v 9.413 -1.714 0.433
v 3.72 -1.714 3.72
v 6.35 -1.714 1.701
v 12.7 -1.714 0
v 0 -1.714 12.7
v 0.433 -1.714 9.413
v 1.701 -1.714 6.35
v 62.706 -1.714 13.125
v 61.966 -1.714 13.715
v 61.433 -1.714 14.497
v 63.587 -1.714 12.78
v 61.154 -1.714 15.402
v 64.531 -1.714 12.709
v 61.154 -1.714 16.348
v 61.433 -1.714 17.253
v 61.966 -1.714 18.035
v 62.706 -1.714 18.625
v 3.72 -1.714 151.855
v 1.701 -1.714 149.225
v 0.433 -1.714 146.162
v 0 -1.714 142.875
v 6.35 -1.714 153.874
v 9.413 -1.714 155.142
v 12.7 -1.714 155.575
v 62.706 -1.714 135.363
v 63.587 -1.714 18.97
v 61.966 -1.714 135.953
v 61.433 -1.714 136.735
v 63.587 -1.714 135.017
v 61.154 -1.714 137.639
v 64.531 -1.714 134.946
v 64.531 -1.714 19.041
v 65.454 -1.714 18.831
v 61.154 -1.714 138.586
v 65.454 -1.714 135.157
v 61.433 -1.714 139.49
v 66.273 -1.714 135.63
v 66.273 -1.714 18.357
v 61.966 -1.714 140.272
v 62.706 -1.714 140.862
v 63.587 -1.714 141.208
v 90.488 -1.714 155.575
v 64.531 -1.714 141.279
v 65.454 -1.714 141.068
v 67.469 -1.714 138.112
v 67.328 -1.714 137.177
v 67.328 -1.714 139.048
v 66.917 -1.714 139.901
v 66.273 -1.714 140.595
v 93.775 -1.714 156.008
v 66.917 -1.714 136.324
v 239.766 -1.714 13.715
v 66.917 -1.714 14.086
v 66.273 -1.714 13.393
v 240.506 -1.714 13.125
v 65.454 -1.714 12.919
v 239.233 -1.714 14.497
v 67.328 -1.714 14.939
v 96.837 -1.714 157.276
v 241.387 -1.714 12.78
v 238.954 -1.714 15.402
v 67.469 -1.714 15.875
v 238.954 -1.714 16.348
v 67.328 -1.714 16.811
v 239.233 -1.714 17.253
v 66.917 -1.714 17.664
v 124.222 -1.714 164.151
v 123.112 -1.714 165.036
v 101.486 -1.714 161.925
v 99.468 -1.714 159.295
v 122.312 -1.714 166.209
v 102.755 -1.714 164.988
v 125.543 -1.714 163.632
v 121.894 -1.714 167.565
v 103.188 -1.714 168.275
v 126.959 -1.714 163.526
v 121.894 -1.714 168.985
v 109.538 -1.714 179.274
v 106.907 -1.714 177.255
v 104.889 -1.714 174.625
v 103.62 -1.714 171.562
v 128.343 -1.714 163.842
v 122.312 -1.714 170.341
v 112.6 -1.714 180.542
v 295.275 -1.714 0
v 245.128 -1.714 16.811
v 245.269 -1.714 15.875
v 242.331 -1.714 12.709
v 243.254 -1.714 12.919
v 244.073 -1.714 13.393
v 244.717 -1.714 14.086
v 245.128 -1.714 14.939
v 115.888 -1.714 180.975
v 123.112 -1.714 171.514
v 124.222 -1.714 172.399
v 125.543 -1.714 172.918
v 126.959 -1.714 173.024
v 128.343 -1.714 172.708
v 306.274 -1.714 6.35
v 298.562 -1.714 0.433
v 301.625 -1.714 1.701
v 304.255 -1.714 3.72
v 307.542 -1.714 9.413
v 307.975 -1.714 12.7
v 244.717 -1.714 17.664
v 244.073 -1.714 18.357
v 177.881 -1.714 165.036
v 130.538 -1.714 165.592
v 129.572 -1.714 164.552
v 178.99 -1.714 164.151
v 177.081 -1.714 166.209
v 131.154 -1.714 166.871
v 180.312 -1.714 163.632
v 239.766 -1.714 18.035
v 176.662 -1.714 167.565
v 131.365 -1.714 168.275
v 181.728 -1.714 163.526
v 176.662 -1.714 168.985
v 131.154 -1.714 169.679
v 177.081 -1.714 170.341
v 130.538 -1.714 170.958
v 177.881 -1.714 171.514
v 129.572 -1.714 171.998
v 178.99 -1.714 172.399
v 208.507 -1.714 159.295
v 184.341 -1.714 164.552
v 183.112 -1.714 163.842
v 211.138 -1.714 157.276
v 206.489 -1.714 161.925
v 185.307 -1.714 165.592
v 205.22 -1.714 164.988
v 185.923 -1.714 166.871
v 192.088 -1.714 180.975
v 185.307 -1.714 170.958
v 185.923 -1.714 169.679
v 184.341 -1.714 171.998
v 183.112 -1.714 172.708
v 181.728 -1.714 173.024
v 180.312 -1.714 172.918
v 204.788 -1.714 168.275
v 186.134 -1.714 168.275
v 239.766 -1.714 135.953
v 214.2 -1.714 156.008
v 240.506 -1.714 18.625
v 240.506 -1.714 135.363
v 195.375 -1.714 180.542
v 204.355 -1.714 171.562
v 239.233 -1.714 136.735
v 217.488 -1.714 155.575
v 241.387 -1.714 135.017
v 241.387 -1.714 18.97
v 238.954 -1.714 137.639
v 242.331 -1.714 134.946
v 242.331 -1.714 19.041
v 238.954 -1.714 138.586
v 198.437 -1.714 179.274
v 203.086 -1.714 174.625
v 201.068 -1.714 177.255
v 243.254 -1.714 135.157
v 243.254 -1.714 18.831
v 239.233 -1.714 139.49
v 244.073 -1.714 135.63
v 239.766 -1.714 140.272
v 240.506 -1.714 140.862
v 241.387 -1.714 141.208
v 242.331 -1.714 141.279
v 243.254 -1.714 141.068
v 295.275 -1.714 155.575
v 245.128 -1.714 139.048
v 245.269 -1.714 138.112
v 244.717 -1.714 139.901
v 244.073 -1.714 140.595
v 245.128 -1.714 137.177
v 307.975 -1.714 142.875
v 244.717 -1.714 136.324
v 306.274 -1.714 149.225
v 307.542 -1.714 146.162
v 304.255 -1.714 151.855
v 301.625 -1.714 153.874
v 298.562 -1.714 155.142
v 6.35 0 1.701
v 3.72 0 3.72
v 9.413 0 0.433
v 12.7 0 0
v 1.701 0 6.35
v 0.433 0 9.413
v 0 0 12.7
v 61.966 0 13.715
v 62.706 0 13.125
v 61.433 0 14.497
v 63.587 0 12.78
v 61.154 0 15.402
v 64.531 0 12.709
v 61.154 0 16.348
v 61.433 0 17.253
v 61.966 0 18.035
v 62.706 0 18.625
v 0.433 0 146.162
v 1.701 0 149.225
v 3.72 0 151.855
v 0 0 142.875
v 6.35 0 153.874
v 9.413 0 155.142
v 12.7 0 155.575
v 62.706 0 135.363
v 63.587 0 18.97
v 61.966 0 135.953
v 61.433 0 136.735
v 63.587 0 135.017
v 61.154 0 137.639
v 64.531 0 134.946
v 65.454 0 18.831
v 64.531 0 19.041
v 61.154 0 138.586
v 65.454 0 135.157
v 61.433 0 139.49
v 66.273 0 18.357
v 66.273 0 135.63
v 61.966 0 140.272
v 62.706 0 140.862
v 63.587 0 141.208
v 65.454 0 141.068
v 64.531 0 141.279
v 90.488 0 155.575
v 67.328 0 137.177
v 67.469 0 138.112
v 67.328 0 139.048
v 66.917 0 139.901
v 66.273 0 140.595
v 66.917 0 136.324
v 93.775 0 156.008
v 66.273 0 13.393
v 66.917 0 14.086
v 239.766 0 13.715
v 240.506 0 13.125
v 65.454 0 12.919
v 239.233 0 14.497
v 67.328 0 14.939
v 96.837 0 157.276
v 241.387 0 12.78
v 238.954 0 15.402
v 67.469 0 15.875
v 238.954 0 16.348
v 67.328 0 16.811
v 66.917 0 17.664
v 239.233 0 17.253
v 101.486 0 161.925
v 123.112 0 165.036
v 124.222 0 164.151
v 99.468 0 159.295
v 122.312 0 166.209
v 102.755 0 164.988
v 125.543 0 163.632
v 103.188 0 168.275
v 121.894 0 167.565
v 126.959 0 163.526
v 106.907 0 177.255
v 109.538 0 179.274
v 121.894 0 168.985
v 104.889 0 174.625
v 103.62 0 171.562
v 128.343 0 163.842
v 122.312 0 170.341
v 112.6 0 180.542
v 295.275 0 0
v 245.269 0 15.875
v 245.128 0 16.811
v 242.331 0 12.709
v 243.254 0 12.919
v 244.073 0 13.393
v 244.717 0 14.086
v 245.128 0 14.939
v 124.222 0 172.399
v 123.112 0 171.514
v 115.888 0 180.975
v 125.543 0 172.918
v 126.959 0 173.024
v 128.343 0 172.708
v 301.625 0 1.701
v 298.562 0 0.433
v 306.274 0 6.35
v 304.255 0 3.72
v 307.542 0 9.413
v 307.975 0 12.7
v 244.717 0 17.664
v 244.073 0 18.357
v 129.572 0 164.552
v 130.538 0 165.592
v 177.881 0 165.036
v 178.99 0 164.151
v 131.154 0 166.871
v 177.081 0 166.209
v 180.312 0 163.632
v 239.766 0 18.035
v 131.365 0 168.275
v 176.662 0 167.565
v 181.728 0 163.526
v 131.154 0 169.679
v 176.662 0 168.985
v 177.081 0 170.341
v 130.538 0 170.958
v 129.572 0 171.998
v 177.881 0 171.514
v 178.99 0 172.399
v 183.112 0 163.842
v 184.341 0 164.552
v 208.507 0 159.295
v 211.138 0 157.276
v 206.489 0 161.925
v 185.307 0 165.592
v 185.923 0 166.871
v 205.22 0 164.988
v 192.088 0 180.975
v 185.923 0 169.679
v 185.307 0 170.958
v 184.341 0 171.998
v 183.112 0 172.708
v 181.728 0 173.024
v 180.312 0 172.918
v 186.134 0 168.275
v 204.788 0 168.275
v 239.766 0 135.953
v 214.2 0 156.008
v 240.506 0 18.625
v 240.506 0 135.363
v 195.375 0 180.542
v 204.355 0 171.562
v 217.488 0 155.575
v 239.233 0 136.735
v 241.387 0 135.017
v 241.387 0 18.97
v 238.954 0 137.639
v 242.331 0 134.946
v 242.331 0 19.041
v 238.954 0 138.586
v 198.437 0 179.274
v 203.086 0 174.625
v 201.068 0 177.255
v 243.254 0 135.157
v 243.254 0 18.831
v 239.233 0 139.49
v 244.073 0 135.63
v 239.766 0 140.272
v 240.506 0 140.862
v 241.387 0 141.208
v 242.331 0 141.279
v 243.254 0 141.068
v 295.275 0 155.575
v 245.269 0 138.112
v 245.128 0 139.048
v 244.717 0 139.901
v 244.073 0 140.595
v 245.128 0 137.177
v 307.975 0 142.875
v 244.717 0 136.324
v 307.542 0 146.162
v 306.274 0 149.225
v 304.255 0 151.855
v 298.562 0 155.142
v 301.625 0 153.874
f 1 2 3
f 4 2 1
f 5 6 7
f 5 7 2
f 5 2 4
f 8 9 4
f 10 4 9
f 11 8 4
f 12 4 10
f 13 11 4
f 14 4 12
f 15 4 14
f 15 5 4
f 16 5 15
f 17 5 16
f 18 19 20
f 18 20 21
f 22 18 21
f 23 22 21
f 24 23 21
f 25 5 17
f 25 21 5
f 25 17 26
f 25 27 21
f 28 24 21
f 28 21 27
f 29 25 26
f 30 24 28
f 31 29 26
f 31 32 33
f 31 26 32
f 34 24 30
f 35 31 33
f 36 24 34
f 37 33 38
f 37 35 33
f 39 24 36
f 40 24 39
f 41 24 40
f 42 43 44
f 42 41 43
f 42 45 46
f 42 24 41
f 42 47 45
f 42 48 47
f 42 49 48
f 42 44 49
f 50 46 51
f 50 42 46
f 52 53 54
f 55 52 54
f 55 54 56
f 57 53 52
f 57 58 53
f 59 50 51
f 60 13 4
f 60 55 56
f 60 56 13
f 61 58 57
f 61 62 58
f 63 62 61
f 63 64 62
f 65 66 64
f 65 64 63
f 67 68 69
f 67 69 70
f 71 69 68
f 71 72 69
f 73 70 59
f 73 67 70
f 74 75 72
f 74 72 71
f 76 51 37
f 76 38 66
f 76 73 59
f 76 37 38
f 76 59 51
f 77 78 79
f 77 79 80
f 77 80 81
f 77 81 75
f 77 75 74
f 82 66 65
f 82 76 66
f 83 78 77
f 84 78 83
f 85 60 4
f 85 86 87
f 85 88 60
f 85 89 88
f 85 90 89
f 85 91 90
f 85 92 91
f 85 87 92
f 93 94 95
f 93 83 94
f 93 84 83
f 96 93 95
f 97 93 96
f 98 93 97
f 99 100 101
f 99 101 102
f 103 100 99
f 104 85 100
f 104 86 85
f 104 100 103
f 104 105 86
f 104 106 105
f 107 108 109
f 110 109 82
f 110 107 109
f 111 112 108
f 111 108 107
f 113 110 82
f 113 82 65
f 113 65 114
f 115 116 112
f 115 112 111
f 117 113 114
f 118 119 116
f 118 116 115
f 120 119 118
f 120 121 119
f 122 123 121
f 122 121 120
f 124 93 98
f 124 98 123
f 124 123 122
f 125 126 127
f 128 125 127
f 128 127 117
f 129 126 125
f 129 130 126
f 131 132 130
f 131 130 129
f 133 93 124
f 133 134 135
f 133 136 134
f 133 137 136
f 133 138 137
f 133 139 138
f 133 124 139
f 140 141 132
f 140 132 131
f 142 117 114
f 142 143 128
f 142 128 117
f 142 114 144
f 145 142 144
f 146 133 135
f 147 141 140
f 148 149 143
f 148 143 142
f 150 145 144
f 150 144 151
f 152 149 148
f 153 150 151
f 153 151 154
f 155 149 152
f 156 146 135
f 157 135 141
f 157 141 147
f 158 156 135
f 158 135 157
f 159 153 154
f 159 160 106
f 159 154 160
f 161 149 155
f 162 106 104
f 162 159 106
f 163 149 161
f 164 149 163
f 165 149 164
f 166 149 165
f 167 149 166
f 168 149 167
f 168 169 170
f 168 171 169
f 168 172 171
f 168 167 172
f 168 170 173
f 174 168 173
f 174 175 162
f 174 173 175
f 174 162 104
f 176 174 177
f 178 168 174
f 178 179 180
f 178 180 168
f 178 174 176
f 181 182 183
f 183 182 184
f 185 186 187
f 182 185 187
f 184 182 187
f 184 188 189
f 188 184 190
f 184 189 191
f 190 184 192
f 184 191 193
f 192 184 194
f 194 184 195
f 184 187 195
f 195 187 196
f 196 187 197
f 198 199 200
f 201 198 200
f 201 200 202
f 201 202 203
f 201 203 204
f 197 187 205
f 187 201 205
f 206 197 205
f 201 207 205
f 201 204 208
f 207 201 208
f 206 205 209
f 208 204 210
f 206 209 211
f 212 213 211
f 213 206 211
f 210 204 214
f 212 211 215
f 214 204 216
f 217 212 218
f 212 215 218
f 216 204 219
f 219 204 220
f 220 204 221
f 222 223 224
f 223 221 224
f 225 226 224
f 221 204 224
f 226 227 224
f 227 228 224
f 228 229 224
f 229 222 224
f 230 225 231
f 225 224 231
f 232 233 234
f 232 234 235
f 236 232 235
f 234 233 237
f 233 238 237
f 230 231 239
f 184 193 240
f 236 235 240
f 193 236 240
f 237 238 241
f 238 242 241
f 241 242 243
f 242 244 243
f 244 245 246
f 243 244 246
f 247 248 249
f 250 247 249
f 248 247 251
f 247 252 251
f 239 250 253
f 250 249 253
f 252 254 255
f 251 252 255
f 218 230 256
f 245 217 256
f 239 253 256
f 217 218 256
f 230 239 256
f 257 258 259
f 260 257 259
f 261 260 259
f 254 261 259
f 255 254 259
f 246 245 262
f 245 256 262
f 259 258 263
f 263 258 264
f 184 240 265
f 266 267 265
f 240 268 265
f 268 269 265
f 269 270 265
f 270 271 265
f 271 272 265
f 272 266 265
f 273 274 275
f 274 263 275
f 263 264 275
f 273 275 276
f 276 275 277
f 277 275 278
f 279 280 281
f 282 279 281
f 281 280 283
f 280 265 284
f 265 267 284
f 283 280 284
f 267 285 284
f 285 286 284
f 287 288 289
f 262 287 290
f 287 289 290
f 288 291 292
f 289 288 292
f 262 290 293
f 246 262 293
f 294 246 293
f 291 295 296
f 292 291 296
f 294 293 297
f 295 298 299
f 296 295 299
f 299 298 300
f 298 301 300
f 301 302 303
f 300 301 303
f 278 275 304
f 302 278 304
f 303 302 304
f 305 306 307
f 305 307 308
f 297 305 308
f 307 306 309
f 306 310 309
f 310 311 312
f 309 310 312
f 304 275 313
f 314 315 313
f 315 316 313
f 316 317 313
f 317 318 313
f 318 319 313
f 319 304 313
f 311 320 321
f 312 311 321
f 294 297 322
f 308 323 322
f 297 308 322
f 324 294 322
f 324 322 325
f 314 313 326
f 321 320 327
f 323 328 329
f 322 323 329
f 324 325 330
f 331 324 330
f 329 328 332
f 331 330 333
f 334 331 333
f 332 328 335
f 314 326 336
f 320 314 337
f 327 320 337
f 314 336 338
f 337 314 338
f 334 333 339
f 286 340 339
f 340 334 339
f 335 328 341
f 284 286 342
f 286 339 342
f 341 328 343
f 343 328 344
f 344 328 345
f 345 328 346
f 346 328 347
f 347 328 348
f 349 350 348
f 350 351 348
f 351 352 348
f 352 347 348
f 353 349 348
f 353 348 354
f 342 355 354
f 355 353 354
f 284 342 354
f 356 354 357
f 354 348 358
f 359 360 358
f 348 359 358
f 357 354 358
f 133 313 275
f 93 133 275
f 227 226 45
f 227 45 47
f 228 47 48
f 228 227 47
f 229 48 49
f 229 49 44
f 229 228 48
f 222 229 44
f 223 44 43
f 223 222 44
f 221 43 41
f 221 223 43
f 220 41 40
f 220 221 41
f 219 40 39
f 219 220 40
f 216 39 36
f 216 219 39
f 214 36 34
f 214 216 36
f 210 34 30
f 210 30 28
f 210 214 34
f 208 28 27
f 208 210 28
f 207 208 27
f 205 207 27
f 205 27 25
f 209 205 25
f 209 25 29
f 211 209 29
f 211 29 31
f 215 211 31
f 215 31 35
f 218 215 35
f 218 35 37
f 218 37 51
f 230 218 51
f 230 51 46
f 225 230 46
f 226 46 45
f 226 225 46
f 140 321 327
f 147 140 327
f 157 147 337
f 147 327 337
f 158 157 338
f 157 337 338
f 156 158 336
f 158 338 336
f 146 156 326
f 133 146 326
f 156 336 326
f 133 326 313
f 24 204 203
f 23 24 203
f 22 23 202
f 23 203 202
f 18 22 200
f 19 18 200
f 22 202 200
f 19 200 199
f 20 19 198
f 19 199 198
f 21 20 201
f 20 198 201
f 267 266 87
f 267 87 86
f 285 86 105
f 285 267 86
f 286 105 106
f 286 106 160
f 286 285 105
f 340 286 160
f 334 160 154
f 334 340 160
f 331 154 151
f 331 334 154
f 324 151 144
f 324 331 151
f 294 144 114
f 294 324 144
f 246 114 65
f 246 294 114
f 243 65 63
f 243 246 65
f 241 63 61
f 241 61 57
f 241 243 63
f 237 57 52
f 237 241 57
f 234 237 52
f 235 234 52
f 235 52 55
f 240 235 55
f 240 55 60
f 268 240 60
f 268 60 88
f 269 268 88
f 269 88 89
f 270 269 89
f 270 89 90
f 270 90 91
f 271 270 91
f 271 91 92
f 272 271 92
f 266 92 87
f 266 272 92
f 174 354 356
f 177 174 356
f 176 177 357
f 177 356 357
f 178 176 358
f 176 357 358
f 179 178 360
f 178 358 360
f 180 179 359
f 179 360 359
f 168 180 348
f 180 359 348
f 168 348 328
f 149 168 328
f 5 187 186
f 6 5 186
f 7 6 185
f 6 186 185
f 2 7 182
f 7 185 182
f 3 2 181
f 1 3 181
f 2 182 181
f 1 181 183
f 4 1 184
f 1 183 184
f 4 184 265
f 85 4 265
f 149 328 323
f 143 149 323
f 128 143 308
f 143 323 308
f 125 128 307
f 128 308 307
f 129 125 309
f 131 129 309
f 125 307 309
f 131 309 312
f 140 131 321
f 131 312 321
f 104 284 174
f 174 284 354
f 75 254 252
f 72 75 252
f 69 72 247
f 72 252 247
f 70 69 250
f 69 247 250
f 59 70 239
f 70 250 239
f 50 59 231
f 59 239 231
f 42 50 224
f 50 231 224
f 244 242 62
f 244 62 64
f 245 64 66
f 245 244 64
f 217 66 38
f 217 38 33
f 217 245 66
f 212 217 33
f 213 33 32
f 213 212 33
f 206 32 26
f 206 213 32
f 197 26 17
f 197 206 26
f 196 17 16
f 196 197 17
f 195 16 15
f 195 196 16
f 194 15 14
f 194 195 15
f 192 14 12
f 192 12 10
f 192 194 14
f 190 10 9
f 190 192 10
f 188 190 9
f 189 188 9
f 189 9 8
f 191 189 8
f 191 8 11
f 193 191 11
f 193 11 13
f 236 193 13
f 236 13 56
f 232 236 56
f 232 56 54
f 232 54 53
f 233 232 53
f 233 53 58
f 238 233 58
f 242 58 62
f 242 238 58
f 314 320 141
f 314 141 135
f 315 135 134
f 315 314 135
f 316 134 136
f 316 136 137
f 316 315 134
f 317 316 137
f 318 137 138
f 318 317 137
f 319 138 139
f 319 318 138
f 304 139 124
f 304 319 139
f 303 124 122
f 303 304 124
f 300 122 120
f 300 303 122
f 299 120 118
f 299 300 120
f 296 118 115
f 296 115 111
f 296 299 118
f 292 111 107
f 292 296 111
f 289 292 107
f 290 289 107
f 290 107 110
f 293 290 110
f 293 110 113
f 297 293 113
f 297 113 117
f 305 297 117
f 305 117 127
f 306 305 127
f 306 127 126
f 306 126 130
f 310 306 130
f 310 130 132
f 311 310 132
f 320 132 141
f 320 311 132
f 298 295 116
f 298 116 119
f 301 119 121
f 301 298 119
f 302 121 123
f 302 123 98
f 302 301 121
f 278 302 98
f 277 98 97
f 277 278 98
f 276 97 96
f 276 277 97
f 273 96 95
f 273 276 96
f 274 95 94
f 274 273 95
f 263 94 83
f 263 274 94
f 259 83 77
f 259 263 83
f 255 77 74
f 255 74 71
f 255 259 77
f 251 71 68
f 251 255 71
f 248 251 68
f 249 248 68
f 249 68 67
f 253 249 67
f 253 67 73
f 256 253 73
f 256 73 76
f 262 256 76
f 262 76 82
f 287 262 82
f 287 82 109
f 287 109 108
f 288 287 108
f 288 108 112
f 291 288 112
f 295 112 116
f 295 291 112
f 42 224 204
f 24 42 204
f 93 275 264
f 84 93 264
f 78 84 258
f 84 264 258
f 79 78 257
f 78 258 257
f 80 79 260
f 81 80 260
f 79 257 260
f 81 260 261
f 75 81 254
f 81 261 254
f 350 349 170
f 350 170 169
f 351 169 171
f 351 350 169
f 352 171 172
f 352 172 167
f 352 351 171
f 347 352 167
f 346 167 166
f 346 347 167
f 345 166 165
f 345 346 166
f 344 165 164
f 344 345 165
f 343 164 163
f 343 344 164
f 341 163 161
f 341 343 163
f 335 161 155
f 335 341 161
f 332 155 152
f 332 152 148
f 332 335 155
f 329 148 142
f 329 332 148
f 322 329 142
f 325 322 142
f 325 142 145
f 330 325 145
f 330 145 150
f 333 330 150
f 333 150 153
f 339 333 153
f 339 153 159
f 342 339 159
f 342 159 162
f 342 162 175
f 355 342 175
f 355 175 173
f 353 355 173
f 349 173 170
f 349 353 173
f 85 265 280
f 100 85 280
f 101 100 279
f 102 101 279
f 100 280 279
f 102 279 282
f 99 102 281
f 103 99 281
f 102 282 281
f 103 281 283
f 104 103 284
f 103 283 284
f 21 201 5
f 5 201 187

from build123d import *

# Parameters (mm, degrees)
F0_R     = 3.175
F0_R_2   = 4.7625
F1_DEPTH = 1.7145


with BuildPart() as f1:
    # F0 (on Front) → F1 (new body)
    with BuildSketch(Plane.XZ):
        with BuildLine():
            ThreePointArc((0, 12.7), (3.719744, 3.719744), (12.7, 0))
            Line((12.7, 0), (295.275, 0))
            ThreePointArc((295.275, 0), (304.255256, 3.719744), (307.975, 12.7))
            Line((307.975, 12.7), (307.975, 142.875))
            ThreePointArc((307.975, 142.875), (304.255256, 151.855256), (295.275, 155.575))
            Line((295.275, 155.575), (217.4875, 155.575))
            ThreePointArc((217.4875, 155.575), (208.507244, 159.294744), (204.7875, 168.275))
            ThreePointArc((204.7875, 168.275), (201.067756, 177.255256), (192.0875, 180.975))
            Line((192.0875, 180.975), (115.8875, 180.975))
            ThreePointArc((115.8875, 180.975), (106.907244, 177.255256), (103.1875, 168.275))
            ThreePointArc((103.1875, 168.275), (99.467756, 159.294744), (90.4875, 155.575))
            Line((90.4875, 155.575), (12.7, 155.575))
            ThreePointArc((12.7, 155.575), (3.719744, 151.855256), (0, 142.875))
            Line((0, 142.875), (0, 12.7))
        make_face()
        with Locations((64.29375, 15.875)):
            Circle(F0_R, mode=Mode.SUBTRACT)
        with Locations((242.09375, 15.875)):
            Circle(F0_R, mode=Mode.SUBTRACT)
        with Locations((64.29375, 138.1125)):
            Circle(F0_R, mode=Mode.SUBTRACT)
        with Locations((126.602998, 168.275)):
            Circle(F0_R_2, mode=Mode.SUBTRACT)
        with Locations((181.371748, 168.275)):
            Circle(F0_R_2, mode=Mode.SUBTRACT)
        with Locations((242.09375, 138.1125)):
            Circle(F0_R, mode=Mode.SUBTRACT)
    extrude(amount=F1_DEPTH)


solid = f1.part
